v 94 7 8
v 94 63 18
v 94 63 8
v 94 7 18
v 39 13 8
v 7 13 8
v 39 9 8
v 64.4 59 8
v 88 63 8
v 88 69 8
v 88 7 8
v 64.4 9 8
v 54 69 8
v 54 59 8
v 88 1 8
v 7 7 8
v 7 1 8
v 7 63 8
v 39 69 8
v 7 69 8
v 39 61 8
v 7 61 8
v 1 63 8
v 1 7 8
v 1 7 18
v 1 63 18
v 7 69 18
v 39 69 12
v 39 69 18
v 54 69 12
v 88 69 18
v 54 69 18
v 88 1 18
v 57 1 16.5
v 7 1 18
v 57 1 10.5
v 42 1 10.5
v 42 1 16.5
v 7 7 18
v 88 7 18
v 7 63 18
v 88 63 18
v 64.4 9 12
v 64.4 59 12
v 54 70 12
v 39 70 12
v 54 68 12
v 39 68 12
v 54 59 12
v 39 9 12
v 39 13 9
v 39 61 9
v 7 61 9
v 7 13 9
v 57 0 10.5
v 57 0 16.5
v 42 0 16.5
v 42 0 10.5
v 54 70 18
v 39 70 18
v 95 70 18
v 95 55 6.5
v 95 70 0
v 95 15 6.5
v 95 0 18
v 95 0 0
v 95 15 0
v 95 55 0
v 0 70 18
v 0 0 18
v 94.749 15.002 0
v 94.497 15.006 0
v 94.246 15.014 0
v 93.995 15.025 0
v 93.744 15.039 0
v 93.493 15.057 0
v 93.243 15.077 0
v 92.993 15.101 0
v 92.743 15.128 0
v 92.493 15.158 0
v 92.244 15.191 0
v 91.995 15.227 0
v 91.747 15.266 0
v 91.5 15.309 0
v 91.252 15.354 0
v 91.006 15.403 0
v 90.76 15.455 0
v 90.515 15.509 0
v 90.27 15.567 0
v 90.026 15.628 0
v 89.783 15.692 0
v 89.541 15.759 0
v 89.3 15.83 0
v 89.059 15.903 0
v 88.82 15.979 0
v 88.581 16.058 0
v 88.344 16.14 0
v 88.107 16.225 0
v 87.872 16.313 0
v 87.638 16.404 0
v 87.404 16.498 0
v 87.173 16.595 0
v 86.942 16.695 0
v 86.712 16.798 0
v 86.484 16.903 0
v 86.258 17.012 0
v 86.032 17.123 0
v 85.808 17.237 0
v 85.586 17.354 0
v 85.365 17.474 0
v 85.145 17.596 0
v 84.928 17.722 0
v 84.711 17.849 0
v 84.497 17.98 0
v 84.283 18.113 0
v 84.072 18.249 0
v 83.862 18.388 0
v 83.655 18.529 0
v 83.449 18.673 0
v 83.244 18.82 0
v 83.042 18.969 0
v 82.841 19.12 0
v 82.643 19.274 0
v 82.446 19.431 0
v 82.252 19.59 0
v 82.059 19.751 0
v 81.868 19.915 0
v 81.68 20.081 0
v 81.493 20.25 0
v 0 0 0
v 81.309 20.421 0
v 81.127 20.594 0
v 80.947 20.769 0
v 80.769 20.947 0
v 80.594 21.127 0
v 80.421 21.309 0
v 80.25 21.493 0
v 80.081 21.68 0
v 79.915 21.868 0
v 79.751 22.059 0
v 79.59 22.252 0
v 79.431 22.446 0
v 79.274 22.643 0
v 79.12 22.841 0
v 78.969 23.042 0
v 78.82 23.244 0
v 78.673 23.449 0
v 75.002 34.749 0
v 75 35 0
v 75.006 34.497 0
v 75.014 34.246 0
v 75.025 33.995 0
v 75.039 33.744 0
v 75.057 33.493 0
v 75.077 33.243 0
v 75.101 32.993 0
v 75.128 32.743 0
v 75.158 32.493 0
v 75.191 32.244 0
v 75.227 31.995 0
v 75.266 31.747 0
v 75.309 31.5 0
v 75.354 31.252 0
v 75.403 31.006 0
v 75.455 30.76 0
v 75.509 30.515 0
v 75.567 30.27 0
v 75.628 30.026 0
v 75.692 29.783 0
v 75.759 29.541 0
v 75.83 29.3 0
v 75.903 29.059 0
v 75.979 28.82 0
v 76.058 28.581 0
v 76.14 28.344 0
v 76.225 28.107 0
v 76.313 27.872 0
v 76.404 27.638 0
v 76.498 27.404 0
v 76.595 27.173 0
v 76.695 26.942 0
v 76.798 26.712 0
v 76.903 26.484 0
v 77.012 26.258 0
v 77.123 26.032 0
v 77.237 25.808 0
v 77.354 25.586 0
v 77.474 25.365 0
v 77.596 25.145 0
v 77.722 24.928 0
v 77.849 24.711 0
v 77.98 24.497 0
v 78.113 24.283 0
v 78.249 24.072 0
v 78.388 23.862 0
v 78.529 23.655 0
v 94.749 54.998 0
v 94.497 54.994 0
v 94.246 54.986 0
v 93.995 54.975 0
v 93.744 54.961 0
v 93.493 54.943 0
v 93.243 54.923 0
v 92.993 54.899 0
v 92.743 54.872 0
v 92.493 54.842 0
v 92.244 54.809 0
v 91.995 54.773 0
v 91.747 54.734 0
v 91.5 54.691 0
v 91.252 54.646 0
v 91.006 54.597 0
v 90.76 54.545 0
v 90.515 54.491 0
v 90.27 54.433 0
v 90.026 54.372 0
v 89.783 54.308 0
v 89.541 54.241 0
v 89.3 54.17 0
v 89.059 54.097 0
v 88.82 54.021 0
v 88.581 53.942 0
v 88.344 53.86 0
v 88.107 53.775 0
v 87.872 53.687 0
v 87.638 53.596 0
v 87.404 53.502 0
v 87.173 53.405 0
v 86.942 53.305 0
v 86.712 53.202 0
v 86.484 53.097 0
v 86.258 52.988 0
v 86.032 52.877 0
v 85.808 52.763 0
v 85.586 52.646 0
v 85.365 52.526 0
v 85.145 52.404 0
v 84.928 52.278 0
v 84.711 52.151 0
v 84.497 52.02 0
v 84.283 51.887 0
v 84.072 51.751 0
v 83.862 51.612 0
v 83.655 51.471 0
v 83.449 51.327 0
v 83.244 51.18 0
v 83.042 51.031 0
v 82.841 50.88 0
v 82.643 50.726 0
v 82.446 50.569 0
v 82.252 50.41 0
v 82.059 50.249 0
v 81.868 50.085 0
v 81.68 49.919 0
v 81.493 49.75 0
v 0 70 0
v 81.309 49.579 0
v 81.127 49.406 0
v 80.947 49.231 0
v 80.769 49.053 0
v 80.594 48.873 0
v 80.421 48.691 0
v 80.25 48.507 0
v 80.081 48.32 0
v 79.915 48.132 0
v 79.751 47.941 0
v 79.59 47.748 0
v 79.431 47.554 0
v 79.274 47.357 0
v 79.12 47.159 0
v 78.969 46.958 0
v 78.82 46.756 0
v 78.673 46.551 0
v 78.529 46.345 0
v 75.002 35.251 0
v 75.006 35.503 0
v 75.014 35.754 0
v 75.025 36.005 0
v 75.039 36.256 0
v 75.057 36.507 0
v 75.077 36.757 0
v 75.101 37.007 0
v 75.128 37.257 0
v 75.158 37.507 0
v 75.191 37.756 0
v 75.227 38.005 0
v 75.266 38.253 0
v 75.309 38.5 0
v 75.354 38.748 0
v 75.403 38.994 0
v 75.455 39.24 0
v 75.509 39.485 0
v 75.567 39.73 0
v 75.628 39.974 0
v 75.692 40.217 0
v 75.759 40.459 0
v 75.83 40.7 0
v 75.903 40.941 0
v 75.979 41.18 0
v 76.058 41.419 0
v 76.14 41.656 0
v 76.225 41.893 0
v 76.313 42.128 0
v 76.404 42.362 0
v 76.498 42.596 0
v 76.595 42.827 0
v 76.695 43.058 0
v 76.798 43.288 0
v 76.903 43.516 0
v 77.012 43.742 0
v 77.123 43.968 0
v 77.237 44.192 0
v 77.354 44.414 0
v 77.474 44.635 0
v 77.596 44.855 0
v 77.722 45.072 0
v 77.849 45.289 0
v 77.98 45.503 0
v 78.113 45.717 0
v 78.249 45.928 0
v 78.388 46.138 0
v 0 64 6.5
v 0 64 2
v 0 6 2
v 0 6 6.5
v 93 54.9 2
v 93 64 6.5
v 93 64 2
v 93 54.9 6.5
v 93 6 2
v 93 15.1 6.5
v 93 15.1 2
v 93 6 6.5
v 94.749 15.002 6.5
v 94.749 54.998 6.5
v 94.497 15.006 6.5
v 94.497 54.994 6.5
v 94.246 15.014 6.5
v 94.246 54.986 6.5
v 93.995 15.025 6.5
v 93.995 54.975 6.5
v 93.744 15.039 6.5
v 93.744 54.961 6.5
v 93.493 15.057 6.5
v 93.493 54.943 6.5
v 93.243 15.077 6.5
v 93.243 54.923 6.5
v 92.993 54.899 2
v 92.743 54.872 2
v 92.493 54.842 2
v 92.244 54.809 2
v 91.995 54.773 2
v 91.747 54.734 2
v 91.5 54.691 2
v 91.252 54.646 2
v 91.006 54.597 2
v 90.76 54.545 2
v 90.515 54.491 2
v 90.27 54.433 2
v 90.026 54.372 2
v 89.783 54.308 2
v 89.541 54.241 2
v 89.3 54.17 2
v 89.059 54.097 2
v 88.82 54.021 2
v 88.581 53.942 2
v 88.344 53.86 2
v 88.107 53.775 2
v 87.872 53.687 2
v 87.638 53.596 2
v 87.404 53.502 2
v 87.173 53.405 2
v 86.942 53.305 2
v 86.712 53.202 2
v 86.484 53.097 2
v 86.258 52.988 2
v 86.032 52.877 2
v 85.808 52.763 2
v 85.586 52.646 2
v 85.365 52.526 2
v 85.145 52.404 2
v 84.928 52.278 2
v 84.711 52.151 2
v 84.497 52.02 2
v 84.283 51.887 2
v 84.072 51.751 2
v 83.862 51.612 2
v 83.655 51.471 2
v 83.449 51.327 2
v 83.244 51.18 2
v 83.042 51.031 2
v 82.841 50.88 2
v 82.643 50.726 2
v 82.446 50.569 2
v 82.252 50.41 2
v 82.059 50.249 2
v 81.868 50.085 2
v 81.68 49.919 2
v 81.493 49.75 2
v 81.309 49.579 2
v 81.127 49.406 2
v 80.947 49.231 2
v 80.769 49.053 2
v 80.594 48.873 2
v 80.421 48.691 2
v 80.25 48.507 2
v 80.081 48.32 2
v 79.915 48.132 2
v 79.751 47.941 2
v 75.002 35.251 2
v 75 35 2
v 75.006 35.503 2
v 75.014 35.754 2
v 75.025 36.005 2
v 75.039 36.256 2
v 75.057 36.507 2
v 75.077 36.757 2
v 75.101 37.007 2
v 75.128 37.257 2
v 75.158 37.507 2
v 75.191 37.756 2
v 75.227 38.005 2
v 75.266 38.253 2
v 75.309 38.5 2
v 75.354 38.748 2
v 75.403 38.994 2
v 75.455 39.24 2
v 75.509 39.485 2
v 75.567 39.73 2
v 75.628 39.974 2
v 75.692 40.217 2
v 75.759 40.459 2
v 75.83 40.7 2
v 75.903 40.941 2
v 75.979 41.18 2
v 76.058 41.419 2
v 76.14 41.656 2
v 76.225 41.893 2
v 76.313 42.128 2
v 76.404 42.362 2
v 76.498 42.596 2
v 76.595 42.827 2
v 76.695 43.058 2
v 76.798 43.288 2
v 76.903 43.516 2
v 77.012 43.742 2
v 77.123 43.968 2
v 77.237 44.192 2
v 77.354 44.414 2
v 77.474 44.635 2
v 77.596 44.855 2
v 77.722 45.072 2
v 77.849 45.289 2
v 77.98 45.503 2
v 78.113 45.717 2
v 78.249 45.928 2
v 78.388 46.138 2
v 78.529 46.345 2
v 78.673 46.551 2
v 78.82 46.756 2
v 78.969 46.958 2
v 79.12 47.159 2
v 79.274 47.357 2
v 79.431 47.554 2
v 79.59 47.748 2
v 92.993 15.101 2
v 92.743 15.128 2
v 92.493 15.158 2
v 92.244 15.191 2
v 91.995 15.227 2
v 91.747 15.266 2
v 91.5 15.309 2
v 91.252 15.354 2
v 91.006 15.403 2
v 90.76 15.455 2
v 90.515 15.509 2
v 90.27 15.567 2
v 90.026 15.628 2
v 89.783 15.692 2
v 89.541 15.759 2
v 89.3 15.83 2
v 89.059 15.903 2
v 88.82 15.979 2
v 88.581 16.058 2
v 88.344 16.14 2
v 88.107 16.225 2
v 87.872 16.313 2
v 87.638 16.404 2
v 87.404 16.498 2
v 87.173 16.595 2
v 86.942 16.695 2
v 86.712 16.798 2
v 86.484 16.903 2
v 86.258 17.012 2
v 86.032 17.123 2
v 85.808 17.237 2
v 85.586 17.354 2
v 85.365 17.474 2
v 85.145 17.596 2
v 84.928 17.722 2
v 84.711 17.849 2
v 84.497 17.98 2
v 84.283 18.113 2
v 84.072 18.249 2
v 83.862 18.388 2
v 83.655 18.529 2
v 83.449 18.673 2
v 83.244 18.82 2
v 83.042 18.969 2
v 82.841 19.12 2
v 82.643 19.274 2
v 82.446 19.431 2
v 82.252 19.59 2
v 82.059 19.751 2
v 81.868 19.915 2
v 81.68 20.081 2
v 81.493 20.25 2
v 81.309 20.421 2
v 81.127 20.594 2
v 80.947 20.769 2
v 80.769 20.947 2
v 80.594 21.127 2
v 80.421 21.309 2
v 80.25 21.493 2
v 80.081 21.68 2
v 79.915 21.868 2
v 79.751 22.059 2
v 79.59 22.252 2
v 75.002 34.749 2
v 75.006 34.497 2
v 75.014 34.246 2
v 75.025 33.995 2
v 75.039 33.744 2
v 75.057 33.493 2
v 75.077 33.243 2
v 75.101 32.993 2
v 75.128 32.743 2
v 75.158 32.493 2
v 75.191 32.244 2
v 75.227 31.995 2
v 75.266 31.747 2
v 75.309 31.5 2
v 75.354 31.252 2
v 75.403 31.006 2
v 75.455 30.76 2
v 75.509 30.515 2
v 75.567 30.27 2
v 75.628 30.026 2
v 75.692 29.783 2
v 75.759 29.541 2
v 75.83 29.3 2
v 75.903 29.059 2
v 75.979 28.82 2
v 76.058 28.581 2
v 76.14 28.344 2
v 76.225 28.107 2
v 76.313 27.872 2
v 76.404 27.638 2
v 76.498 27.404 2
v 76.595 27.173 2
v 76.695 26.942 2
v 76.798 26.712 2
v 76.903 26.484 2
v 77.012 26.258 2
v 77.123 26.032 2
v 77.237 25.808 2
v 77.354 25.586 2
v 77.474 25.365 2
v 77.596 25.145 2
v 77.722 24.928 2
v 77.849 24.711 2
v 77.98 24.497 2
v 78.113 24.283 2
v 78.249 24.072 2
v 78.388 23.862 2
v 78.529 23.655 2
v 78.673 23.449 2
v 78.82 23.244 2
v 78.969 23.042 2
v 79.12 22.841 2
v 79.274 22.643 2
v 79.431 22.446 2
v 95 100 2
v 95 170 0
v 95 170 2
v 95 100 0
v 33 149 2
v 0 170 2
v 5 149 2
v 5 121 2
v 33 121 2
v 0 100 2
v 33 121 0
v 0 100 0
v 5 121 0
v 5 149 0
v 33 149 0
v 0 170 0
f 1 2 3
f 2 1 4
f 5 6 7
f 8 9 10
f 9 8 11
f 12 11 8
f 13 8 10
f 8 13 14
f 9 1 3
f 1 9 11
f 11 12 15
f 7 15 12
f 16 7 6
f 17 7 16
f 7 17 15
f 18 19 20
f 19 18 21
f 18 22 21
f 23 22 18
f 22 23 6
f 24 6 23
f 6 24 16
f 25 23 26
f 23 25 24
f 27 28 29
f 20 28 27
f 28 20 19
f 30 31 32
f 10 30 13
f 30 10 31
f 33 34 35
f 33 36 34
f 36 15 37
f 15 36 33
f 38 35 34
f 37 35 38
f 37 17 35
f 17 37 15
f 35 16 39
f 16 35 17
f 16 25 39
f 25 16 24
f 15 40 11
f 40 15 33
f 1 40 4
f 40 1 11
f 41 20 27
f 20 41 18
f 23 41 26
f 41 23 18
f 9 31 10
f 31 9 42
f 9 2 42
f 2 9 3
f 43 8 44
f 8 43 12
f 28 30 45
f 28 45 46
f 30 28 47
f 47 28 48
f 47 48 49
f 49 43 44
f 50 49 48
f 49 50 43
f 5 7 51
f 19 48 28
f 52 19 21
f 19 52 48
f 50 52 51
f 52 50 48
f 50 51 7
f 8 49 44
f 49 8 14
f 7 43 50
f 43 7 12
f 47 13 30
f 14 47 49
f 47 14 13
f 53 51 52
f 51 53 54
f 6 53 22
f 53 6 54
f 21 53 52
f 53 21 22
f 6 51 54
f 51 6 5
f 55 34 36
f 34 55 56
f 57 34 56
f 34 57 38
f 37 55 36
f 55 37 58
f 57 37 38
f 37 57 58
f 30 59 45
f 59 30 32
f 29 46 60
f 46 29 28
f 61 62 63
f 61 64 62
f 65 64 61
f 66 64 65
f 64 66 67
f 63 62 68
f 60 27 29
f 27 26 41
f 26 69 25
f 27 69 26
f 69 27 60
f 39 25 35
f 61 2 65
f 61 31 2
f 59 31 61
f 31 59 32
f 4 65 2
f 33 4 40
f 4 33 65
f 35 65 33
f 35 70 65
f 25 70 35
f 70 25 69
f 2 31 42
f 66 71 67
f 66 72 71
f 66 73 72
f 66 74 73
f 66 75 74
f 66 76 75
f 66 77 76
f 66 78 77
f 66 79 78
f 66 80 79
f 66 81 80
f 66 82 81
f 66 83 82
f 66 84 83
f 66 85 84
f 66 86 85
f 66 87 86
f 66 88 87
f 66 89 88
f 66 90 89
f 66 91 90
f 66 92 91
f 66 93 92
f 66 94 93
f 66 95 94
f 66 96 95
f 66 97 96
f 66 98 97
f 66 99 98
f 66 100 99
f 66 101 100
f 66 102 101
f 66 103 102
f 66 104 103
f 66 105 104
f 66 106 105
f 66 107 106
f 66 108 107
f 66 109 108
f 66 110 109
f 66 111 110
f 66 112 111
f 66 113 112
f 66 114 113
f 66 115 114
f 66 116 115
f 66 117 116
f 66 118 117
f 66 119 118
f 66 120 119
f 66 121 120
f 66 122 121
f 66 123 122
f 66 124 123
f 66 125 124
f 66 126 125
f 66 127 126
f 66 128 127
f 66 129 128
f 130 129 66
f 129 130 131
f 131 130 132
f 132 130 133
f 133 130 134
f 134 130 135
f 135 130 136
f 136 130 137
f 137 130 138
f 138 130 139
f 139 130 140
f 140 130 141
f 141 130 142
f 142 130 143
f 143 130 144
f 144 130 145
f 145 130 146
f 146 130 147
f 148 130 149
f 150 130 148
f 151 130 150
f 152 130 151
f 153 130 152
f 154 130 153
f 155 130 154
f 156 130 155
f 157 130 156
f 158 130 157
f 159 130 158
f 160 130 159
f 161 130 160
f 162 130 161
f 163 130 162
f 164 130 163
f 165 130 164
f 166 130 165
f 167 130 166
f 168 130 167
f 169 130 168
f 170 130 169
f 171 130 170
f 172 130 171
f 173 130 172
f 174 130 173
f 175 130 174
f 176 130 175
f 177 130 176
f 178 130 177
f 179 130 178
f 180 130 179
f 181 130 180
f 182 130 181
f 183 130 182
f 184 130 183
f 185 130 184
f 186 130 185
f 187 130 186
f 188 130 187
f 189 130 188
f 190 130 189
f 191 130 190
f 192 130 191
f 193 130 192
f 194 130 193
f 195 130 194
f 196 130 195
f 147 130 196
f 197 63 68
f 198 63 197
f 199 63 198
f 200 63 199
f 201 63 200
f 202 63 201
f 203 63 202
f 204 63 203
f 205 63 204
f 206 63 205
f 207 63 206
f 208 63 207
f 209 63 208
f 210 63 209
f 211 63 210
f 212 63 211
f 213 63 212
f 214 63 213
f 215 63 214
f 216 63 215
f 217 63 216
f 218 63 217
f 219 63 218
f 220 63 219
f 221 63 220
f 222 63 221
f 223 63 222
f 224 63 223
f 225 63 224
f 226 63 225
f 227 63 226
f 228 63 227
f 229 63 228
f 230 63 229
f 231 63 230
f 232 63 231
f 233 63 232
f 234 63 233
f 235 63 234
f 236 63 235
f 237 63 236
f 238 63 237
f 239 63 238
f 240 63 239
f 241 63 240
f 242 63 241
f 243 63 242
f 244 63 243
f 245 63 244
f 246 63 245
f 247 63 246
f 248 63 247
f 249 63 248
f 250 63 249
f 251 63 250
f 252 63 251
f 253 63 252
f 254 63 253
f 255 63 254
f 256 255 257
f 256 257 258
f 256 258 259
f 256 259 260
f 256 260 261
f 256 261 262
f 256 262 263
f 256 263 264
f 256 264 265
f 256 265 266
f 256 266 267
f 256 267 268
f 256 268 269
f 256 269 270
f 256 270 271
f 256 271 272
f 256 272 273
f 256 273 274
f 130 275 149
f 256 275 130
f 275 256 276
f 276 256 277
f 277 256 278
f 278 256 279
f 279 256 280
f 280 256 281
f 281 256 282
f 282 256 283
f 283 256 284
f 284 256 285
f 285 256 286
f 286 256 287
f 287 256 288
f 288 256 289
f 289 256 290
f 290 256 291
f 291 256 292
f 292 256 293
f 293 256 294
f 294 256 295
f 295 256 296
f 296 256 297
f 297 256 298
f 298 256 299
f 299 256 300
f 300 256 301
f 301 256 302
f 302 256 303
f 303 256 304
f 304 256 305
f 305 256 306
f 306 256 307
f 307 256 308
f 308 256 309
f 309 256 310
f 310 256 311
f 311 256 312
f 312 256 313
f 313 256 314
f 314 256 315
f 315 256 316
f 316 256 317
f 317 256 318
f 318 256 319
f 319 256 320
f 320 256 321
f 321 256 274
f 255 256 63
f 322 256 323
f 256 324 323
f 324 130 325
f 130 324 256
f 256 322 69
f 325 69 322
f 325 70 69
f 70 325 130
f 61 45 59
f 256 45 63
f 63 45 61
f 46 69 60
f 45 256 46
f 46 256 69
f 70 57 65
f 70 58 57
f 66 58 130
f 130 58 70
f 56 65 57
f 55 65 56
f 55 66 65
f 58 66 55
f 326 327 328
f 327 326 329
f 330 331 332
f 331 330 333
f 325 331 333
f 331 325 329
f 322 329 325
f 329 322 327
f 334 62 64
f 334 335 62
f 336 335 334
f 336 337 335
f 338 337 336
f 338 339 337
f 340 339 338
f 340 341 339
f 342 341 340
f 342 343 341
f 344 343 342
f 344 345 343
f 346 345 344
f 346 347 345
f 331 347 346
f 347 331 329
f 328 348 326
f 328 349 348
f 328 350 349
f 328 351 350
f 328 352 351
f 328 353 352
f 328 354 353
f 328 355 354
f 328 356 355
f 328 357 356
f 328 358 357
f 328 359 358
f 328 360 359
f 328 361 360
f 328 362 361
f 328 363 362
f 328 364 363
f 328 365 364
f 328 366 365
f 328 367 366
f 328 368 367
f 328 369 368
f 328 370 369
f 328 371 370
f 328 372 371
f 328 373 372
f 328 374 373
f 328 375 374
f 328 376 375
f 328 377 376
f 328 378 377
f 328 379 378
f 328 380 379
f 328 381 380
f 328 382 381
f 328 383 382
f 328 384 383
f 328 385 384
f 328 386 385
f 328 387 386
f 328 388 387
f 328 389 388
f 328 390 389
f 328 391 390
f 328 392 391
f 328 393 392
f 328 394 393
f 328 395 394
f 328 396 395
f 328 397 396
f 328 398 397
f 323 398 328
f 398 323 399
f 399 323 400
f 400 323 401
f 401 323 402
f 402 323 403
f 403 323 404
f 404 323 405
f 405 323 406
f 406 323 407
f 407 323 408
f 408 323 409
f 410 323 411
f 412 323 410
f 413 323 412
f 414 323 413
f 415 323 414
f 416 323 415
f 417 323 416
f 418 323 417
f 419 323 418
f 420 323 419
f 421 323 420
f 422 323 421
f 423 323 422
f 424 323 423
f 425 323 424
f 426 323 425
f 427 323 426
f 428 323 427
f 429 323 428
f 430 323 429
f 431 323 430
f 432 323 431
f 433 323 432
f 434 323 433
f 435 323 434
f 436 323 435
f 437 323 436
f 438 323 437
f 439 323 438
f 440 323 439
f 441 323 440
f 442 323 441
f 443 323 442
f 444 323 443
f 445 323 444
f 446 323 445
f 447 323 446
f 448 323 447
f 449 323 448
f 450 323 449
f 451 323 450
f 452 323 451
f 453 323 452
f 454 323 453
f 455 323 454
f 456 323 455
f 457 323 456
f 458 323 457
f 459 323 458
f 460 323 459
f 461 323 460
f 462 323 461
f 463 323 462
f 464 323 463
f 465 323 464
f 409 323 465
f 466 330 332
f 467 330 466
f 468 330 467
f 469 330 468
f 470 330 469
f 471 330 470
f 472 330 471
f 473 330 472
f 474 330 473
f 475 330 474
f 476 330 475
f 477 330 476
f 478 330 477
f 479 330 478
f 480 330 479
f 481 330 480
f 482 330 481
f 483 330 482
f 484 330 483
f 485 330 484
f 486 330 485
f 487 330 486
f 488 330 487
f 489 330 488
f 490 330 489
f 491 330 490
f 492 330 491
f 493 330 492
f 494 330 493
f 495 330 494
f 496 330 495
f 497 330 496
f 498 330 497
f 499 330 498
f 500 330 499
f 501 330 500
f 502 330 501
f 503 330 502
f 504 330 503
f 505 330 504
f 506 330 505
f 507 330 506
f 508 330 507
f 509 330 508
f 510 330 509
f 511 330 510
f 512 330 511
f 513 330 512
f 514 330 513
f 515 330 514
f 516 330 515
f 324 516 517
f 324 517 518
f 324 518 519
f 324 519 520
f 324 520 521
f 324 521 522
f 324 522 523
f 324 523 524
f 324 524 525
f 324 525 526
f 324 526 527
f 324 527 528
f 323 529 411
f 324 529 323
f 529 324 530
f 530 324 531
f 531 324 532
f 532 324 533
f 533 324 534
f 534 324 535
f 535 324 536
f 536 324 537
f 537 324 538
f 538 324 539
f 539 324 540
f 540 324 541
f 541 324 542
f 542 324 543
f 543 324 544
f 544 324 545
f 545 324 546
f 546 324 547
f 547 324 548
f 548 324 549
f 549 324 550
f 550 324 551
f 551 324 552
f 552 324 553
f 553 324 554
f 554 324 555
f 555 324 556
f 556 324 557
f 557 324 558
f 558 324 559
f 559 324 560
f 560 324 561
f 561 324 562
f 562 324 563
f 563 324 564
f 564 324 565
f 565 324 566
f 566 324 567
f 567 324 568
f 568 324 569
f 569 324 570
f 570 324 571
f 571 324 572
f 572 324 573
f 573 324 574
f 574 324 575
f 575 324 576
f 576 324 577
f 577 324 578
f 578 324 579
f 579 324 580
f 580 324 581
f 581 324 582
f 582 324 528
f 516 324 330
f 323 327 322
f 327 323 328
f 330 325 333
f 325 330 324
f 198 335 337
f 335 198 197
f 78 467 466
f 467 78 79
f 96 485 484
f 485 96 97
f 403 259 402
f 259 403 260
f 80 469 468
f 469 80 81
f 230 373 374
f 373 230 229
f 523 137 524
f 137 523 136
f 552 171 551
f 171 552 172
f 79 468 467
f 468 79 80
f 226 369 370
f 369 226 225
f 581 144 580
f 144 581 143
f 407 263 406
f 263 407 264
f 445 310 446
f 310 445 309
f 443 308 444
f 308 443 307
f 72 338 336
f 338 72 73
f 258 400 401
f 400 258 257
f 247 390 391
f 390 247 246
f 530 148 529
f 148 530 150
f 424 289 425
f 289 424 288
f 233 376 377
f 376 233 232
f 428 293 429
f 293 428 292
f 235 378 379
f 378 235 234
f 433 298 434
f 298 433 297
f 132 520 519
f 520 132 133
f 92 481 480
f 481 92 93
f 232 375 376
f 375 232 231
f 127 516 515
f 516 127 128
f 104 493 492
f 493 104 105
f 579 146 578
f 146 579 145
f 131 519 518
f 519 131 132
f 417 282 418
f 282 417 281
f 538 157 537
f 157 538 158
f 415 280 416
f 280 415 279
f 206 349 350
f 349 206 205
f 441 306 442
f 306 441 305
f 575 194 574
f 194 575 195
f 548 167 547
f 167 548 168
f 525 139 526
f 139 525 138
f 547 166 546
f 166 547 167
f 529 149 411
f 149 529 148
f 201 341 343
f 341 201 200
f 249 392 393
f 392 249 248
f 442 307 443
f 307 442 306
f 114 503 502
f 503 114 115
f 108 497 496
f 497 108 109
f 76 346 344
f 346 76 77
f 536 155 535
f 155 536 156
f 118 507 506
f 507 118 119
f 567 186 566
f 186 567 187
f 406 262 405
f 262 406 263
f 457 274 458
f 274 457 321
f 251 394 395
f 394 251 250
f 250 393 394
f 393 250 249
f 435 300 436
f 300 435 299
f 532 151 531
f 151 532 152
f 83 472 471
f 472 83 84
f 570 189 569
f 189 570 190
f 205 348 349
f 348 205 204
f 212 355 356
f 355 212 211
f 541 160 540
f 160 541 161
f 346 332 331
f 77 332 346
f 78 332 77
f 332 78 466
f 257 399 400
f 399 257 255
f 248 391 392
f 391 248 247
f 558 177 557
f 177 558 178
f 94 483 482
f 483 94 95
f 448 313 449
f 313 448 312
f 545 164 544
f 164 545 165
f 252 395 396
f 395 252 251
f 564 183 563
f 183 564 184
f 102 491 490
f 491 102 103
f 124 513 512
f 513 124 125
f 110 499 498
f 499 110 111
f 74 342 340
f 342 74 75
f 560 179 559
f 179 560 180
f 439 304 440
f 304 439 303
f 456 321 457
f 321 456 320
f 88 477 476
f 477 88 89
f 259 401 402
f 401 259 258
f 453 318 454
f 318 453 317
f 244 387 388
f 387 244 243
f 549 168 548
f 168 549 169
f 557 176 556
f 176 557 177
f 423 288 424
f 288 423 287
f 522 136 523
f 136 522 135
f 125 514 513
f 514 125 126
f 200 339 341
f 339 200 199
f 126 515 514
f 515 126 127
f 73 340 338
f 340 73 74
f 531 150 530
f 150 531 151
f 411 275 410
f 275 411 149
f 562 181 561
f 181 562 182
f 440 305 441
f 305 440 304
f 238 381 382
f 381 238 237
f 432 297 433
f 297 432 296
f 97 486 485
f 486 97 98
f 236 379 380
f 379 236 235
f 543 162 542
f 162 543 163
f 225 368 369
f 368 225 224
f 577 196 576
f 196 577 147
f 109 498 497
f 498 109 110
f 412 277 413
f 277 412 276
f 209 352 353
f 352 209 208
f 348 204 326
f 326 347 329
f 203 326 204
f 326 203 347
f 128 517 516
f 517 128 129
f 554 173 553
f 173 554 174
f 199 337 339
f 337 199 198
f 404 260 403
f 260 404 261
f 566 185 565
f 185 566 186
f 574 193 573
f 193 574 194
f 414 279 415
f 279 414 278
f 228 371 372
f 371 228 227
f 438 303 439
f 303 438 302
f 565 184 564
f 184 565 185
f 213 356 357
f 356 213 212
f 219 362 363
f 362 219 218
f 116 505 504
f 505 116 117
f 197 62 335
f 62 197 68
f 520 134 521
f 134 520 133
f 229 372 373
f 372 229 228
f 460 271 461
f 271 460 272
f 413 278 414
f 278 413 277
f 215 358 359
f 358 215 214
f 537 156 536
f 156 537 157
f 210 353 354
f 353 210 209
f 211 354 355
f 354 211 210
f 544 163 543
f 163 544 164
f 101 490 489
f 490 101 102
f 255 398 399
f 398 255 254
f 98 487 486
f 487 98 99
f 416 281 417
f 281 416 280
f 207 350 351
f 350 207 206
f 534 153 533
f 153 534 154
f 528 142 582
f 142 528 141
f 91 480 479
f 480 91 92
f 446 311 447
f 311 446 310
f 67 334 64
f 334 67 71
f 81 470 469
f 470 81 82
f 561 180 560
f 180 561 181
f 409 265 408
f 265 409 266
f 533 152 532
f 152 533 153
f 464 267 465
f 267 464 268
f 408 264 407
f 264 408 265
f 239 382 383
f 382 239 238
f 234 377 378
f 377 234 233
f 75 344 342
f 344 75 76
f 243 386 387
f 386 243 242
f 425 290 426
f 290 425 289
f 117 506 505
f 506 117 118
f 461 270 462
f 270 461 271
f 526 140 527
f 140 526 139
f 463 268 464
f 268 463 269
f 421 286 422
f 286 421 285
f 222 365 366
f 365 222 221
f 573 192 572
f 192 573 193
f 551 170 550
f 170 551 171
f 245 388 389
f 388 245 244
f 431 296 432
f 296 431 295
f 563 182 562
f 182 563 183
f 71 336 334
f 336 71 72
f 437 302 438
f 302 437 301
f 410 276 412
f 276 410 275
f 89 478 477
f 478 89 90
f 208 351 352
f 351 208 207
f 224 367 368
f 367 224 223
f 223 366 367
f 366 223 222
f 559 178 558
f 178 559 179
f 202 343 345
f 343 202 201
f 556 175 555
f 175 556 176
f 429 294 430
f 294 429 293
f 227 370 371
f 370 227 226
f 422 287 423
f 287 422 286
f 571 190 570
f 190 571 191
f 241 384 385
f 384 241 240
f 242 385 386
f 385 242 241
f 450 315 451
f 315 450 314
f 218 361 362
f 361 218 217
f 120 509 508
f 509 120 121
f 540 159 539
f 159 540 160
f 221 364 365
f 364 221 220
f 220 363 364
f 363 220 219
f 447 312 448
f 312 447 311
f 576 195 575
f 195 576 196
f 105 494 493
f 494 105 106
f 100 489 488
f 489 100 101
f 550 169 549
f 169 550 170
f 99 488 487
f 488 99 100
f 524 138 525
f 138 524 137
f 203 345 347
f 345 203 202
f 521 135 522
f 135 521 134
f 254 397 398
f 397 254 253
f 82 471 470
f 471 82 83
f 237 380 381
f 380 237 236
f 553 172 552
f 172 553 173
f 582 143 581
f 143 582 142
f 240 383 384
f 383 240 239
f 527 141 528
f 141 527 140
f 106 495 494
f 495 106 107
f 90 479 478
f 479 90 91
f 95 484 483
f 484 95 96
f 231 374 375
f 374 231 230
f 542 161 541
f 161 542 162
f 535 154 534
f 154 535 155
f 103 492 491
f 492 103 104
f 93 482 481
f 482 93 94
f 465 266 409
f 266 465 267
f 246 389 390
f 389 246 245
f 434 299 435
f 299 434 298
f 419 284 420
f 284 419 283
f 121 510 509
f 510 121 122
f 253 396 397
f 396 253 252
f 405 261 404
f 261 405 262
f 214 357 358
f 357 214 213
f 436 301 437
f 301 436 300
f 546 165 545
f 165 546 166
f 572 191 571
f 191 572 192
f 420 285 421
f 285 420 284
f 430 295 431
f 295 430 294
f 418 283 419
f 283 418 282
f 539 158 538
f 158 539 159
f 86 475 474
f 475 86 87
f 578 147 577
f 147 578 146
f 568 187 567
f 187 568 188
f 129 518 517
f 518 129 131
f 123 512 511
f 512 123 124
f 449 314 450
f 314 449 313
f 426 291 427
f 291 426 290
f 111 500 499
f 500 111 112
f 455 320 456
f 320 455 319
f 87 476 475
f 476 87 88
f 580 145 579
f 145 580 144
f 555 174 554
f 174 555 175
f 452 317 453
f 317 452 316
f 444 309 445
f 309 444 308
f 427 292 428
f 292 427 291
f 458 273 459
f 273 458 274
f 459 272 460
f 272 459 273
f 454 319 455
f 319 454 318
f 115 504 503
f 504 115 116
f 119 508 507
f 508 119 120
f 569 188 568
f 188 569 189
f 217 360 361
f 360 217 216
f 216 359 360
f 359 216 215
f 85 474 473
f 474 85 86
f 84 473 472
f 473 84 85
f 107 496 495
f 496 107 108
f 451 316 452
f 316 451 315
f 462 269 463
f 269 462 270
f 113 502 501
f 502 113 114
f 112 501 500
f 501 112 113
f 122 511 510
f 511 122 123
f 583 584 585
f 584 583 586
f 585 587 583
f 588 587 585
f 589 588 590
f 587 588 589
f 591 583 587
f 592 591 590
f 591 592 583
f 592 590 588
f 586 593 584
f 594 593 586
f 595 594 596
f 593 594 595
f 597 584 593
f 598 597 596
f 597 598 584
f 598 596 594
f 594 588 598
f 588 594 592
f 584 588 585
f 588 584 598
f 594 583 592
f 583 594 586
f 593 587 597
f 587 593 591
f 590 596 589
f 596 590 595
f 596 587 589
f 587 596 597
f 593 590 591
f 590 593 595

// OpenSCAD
echo(version=version());

// creditcard sizes
cc_x = 86; 	// width
cc_y = 58; 	// height
cc_z = 0.9; 	// thickness
cc_r = 3.18; 	// rounded corner radius
cc_h = 0.8; 	// rounded corner thickness

// pusher cutout sizes
radius = 20;
height = 10;

// global settings
$fn=500;

module creditcard()
{
	color("red")  
	minkowski()
	{
		cube([cc_x - (2 * cc_r), cc_y - (2 *cc_r), cc_z/2]);
		cylinder(r = cc_r, h = cc_z/2, center = true);
	}
}

module eink_screen_cutout()
{
	color("brown")
	difference()
	{
		cube([93,68,11]);
		
		translate([-1,-1,-1])
		cube([7,7,13]); 			// corner
		
		translate([87,-1,-1])
		cube([7,7,13]);			// corner
		
		translate([-1, 62,-1])
		cube([7,7,13]);			// corner
		
		translate([87,62,-1])
		cube([7,7,13]);			// corner
		
		translate([38,8,-1])
		cube([25.4, 50, 5]);		// wemos raiser
				
		translate([38,57,-1])
		cube([15, 15, 5]);			// charger raiser
		
		translate([6,12,-1])
		cube([33, 48, 2]);			// e ink risaer
	}
	union()
	{
		translate([41,-2,2.5])
		cube([15,5,6]);				// button
		
		translate([38,67,4])
		cube([15,6,8]);				// charger hole
	}
}

module cc_cutout(x,y,z)
{
	color("blue")
	cube([x, y, z]);
}

module pusher_cutout()
{	
	color("green")
	cylinder(r=radius,h=height);
}

module cc_box_lid()
{
	color("white")
	
	
	difference()
	{	
		cube([95,70,2]);
		translate([5,21,-1])
		cube([28,28,4]);
	}
	
}

module cc_box()
{
	color("yellow")
	difference()
	{
		cube([95,70,18]);
		
		translate([-3,6,2])
		cc_cutout(cc_x+10,cc_y,cc_z*5); // x 1cm longer to have it stick out, z times 5 to simulate 5 cards	
		
		translate([105, 35, -3.5])
		pusher_cutout();
		translate([100, 35, -3.5])
		pusher_cutout();
		translate([95, 35, -3.5])
		pusher_cutout();
		
		translate([1,1,8])
		eink_screen_cutout();
	}
}


//translate([0,-400,0])
//eink_screen_cutout();
//
//translate([radius,-250,0])
//pusher_cutout();
//
//translate([cc_r, -100,0])
//creditcard();
//
//translate([0,-200,0])
//cc_cutout(cc_x,cc_y,cc_z);

translate([0,0,0])
cc_box();

translate([0,100,0])
cc_box_lid();
